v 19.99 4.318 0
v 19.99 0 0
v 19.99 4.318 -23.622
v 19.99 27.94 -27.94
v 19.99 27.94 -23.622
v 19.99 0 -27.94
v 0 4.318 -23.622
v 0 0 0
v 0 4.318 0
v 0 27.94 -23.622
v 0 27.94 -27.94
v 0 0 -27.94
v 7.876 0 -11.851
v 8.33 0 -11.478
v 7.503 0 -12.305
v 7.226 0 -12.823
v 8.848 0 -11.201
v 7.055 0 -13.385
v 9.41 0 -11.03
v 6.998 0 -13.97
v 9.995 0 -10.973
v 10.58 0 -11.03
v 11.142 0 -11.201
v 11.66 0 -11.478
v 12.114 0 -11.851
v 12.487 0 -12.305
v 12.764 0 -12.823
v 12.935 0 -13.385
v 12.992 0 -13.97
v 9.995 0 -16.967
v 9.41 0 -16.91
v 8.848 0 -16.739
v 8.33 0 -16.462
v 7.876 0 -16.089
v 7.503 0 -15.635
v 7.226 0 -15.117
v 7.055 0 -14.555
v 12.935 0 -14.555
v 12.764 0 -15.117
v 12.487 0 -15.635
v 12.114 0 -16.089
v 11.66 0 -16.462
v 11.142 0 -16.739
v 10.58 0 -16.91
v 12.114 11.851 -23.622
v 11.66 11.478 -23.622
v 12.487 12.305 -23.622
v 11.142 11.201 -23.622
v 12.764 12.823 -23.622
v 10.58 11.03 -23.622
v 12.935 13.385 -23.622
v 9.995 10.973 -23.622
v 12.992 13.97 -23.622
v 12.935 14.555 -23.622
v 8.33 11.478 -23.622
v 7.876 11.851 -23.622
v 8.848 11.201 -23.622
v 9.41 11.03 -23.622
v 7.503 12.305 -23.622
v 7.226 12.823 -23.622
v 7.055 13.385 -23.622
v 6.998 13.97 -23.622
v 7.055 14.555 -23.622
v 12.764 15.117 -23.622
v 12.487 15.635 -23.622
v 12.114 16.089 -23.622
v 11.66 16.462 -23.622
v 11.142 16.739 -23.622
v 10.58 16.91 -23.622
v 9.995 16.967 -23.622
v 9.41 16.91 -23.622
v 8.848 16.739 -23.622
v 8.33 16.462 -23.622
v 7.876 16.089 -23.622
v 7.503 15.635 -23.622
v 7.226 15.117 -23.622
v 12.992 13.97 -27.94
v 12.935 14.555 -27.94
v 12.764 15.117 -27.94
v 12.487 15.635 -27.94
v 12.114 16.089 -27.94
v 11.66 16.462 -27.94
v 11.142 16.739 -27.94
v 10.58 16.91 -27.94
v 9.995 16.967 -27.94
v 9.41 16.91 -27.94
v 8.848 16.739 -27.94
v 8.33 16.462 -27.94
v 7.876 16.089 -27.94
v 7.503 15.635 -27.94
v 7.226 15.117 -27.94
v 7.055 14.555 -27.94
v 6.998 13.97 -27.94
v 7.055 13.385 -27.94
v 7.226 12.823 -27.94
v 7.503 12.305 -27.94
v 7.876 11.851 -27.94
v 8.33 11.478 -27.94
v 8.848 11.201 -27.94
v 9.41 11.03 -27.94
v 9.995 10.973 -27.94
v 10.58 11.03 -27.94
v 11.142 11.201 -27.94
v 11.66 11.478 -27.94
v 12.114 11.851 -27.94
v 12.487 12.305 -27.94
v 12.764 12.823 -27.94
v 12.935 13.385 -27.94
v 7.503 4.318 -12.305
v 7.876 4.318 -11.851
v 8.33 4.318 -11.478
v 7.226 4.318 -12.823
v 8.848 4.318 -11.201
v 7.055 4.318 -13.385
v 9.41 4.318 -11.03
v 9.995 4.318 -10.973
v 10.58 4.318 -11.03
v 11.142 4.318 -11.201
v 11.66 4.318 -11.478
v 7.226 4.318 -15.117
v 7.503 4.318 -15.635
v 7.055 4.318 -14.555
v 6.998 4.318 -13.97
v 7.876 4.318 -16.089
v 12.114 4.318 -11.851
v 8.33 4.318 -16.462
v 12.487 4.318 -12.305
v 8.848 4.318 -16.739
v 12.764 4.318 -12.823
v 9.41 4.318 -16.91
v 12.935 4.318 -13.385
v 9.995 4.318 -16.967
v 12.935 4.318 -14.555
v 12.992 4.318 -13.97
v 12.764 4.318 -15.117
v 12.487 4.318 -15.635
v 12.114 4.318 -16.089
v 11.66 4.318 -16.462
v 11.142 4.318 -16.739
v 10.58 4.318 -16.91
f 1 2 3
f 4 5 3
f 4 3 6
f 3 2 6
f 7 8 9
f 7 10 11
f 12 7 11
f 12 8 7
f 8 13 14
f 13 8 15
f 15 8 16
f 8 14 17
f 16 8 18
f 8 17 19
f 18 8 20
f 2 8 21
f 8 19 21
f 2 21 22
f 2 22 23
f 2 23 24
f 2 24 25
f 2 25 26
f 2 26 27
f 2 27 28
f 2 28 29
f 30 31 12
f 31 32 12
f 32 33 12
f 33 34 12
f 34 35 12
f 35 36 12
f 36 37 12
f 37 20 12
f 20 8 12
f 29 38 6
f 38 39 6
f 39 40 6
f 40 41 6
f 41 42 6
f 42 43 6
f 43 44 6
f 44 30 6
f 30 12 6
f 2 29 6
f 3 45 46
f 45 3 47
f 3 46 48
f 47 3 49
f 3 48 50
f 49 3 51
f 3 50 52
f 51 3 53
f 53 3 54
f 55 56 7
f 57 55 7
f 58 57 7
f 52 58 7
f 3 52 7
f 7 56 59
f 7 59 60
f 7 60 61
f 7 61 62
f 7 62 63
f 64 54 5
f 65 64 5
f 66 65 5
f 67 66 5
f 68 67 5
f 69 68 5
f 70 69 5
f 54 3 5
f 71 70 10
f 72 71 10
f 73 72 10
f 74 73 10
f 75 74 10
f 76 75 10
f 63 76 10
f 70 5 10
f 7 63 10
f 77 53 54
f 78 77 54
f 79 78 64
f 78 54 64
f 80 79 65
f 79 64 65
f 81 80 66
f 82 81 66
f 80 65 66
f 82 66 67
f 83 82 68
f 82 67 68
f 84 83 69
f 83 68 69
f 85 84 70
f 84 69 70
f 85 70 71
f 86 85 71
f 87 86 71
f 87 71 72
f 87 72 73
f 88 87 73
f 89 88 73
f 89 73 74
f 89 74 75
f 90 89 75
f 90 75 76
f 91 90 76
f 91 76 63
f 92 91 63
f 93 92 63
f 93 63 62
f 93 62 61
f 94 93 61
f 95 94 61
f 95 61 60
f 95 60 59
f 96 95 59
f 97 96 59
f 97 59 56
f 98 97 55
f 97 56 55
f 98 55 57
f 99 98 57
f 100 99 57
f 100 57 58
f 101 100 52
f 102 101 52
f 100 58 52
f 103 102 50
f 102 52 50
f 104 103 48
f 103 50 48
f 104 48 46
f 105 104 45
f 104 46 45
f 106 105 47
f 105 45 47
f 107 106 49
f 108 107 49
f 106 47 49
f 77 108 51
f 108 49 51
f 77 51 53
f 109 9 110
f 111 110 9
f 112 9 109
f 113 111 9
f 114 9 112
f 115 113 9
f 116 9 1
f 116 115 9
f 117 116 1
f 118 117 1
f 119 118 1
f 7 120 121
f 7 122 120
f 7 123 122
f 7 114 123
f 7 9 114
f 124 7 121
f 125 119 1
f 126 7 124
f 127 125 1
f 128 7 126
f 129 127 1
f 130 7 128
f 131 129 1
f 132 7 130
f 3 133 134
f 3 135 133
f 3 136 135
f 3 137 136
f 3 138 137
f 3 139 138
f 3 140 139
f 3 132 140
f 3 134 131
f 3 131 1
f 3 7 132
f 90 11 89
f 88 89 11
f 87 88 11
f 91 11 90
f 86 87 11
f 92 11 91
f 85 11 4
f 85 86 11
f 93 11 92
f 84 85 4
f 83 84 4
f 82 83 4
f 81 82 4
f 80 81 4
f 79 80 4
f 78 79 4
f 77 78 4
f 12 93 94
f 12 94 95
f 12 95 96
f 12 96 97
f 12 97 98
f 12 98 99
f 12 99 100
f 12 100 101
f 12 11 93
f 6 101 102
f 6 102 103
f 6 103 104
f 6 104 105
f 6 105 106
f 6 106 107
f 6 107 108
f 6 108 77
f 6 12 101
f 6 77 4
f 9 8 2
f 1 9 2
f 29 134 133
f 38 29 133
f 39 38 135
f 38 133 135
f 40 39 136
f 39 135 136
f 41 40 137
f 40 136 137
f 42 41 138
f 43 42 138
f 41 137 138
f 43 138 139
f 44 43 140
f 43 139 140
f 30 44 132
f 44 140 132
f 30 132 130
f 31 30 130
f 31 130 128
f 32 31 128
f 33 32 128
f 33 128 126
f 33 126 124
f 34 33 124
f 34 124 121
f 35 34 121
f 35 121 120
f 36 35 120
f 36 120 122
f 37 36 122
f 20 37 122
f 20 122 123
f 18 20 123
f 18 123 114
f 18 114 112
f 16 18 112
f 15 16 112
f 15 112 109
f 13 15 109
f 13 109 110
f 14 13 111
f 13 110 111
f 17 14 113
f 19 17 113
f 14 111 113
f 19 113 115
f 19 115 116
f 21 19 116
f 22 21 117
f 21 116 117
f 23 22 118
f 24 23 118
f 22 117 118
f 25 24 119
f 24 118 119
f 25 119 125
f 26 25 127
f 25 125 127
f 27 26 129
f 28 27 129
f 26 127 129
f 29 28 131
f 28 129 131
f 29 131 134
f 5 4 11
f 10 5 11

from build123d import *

# Parameters (mm, degrees)
SKETCH1_W           = 19.9898
SKETCH1_H           = 27.94
BOSS_EXTRUDE1_DEPTH = 4.318
SKETCH2_W           = 19.9898
SKETCH2_H           = 27.94
BOSS_EXTRUDE2_DEPTH = 4.318
SKETCH3_R           = 2.9972
CUT_EXTRUDE3_DEPTH  = 5.318
SKETCH4_R           = 2.9972
CUT_EXTRUDE4_DEPTH  = 5.318


with BuildPart() as part:
    # Sketch1 → Boss-Extrude1 (new body)
    with BuildSketch(Plane(origin=(0, 0, 0), x_dir=(1, 0, 0), z_dir=(0, 1, 0))):
        with Locations((9.9949, 13.97)):
            Rectangle(SKETCH1_W, SKETCH1_H)
    extrude(amount=BOSS_EXTRUDE1_DEPTH)

    # Sketch2 → Boss-Extrude2 (add)
    with BuildSketch(Plane(origin=(0, 0, -27.94), x_dir=(-1, 0, 0), z_dir=(0, 0, -1))):
        with Locations((-9.9949, 13.97)):
            Rectangle(SKETCH2_W, SKETCH2_H)
    extrude(amount=-BOSS_EXTRUDE2_DEPTH)

    # Sketch3 → Cut-Extrude3 (cut, through all)
    with BuildSketch(Plane(origin=(0, 4.318, 0), x_dir=(1, 0, 0), z_dir=(0, 1, 0))):
        with Locations((9.9949, 13.97)):
            Circle(SKETCH3_R)
    extrude(amount=-CUT_EXTRUDE3_DEPTH, mode=Mode.SUBTRACT)

    # Sketch4 → Cut-Extrude4 (cut, through all)
    with BuildSketch(Plane.XY.offset(-23.622)):
        with Locations((9.9949, 13.97)):
            Circle(SKETCH4_R)
    extrude(amount=-CUT_EXTRUDE4_DEPTH, mode=Mode.SUBTRACT)


solid = part.part
